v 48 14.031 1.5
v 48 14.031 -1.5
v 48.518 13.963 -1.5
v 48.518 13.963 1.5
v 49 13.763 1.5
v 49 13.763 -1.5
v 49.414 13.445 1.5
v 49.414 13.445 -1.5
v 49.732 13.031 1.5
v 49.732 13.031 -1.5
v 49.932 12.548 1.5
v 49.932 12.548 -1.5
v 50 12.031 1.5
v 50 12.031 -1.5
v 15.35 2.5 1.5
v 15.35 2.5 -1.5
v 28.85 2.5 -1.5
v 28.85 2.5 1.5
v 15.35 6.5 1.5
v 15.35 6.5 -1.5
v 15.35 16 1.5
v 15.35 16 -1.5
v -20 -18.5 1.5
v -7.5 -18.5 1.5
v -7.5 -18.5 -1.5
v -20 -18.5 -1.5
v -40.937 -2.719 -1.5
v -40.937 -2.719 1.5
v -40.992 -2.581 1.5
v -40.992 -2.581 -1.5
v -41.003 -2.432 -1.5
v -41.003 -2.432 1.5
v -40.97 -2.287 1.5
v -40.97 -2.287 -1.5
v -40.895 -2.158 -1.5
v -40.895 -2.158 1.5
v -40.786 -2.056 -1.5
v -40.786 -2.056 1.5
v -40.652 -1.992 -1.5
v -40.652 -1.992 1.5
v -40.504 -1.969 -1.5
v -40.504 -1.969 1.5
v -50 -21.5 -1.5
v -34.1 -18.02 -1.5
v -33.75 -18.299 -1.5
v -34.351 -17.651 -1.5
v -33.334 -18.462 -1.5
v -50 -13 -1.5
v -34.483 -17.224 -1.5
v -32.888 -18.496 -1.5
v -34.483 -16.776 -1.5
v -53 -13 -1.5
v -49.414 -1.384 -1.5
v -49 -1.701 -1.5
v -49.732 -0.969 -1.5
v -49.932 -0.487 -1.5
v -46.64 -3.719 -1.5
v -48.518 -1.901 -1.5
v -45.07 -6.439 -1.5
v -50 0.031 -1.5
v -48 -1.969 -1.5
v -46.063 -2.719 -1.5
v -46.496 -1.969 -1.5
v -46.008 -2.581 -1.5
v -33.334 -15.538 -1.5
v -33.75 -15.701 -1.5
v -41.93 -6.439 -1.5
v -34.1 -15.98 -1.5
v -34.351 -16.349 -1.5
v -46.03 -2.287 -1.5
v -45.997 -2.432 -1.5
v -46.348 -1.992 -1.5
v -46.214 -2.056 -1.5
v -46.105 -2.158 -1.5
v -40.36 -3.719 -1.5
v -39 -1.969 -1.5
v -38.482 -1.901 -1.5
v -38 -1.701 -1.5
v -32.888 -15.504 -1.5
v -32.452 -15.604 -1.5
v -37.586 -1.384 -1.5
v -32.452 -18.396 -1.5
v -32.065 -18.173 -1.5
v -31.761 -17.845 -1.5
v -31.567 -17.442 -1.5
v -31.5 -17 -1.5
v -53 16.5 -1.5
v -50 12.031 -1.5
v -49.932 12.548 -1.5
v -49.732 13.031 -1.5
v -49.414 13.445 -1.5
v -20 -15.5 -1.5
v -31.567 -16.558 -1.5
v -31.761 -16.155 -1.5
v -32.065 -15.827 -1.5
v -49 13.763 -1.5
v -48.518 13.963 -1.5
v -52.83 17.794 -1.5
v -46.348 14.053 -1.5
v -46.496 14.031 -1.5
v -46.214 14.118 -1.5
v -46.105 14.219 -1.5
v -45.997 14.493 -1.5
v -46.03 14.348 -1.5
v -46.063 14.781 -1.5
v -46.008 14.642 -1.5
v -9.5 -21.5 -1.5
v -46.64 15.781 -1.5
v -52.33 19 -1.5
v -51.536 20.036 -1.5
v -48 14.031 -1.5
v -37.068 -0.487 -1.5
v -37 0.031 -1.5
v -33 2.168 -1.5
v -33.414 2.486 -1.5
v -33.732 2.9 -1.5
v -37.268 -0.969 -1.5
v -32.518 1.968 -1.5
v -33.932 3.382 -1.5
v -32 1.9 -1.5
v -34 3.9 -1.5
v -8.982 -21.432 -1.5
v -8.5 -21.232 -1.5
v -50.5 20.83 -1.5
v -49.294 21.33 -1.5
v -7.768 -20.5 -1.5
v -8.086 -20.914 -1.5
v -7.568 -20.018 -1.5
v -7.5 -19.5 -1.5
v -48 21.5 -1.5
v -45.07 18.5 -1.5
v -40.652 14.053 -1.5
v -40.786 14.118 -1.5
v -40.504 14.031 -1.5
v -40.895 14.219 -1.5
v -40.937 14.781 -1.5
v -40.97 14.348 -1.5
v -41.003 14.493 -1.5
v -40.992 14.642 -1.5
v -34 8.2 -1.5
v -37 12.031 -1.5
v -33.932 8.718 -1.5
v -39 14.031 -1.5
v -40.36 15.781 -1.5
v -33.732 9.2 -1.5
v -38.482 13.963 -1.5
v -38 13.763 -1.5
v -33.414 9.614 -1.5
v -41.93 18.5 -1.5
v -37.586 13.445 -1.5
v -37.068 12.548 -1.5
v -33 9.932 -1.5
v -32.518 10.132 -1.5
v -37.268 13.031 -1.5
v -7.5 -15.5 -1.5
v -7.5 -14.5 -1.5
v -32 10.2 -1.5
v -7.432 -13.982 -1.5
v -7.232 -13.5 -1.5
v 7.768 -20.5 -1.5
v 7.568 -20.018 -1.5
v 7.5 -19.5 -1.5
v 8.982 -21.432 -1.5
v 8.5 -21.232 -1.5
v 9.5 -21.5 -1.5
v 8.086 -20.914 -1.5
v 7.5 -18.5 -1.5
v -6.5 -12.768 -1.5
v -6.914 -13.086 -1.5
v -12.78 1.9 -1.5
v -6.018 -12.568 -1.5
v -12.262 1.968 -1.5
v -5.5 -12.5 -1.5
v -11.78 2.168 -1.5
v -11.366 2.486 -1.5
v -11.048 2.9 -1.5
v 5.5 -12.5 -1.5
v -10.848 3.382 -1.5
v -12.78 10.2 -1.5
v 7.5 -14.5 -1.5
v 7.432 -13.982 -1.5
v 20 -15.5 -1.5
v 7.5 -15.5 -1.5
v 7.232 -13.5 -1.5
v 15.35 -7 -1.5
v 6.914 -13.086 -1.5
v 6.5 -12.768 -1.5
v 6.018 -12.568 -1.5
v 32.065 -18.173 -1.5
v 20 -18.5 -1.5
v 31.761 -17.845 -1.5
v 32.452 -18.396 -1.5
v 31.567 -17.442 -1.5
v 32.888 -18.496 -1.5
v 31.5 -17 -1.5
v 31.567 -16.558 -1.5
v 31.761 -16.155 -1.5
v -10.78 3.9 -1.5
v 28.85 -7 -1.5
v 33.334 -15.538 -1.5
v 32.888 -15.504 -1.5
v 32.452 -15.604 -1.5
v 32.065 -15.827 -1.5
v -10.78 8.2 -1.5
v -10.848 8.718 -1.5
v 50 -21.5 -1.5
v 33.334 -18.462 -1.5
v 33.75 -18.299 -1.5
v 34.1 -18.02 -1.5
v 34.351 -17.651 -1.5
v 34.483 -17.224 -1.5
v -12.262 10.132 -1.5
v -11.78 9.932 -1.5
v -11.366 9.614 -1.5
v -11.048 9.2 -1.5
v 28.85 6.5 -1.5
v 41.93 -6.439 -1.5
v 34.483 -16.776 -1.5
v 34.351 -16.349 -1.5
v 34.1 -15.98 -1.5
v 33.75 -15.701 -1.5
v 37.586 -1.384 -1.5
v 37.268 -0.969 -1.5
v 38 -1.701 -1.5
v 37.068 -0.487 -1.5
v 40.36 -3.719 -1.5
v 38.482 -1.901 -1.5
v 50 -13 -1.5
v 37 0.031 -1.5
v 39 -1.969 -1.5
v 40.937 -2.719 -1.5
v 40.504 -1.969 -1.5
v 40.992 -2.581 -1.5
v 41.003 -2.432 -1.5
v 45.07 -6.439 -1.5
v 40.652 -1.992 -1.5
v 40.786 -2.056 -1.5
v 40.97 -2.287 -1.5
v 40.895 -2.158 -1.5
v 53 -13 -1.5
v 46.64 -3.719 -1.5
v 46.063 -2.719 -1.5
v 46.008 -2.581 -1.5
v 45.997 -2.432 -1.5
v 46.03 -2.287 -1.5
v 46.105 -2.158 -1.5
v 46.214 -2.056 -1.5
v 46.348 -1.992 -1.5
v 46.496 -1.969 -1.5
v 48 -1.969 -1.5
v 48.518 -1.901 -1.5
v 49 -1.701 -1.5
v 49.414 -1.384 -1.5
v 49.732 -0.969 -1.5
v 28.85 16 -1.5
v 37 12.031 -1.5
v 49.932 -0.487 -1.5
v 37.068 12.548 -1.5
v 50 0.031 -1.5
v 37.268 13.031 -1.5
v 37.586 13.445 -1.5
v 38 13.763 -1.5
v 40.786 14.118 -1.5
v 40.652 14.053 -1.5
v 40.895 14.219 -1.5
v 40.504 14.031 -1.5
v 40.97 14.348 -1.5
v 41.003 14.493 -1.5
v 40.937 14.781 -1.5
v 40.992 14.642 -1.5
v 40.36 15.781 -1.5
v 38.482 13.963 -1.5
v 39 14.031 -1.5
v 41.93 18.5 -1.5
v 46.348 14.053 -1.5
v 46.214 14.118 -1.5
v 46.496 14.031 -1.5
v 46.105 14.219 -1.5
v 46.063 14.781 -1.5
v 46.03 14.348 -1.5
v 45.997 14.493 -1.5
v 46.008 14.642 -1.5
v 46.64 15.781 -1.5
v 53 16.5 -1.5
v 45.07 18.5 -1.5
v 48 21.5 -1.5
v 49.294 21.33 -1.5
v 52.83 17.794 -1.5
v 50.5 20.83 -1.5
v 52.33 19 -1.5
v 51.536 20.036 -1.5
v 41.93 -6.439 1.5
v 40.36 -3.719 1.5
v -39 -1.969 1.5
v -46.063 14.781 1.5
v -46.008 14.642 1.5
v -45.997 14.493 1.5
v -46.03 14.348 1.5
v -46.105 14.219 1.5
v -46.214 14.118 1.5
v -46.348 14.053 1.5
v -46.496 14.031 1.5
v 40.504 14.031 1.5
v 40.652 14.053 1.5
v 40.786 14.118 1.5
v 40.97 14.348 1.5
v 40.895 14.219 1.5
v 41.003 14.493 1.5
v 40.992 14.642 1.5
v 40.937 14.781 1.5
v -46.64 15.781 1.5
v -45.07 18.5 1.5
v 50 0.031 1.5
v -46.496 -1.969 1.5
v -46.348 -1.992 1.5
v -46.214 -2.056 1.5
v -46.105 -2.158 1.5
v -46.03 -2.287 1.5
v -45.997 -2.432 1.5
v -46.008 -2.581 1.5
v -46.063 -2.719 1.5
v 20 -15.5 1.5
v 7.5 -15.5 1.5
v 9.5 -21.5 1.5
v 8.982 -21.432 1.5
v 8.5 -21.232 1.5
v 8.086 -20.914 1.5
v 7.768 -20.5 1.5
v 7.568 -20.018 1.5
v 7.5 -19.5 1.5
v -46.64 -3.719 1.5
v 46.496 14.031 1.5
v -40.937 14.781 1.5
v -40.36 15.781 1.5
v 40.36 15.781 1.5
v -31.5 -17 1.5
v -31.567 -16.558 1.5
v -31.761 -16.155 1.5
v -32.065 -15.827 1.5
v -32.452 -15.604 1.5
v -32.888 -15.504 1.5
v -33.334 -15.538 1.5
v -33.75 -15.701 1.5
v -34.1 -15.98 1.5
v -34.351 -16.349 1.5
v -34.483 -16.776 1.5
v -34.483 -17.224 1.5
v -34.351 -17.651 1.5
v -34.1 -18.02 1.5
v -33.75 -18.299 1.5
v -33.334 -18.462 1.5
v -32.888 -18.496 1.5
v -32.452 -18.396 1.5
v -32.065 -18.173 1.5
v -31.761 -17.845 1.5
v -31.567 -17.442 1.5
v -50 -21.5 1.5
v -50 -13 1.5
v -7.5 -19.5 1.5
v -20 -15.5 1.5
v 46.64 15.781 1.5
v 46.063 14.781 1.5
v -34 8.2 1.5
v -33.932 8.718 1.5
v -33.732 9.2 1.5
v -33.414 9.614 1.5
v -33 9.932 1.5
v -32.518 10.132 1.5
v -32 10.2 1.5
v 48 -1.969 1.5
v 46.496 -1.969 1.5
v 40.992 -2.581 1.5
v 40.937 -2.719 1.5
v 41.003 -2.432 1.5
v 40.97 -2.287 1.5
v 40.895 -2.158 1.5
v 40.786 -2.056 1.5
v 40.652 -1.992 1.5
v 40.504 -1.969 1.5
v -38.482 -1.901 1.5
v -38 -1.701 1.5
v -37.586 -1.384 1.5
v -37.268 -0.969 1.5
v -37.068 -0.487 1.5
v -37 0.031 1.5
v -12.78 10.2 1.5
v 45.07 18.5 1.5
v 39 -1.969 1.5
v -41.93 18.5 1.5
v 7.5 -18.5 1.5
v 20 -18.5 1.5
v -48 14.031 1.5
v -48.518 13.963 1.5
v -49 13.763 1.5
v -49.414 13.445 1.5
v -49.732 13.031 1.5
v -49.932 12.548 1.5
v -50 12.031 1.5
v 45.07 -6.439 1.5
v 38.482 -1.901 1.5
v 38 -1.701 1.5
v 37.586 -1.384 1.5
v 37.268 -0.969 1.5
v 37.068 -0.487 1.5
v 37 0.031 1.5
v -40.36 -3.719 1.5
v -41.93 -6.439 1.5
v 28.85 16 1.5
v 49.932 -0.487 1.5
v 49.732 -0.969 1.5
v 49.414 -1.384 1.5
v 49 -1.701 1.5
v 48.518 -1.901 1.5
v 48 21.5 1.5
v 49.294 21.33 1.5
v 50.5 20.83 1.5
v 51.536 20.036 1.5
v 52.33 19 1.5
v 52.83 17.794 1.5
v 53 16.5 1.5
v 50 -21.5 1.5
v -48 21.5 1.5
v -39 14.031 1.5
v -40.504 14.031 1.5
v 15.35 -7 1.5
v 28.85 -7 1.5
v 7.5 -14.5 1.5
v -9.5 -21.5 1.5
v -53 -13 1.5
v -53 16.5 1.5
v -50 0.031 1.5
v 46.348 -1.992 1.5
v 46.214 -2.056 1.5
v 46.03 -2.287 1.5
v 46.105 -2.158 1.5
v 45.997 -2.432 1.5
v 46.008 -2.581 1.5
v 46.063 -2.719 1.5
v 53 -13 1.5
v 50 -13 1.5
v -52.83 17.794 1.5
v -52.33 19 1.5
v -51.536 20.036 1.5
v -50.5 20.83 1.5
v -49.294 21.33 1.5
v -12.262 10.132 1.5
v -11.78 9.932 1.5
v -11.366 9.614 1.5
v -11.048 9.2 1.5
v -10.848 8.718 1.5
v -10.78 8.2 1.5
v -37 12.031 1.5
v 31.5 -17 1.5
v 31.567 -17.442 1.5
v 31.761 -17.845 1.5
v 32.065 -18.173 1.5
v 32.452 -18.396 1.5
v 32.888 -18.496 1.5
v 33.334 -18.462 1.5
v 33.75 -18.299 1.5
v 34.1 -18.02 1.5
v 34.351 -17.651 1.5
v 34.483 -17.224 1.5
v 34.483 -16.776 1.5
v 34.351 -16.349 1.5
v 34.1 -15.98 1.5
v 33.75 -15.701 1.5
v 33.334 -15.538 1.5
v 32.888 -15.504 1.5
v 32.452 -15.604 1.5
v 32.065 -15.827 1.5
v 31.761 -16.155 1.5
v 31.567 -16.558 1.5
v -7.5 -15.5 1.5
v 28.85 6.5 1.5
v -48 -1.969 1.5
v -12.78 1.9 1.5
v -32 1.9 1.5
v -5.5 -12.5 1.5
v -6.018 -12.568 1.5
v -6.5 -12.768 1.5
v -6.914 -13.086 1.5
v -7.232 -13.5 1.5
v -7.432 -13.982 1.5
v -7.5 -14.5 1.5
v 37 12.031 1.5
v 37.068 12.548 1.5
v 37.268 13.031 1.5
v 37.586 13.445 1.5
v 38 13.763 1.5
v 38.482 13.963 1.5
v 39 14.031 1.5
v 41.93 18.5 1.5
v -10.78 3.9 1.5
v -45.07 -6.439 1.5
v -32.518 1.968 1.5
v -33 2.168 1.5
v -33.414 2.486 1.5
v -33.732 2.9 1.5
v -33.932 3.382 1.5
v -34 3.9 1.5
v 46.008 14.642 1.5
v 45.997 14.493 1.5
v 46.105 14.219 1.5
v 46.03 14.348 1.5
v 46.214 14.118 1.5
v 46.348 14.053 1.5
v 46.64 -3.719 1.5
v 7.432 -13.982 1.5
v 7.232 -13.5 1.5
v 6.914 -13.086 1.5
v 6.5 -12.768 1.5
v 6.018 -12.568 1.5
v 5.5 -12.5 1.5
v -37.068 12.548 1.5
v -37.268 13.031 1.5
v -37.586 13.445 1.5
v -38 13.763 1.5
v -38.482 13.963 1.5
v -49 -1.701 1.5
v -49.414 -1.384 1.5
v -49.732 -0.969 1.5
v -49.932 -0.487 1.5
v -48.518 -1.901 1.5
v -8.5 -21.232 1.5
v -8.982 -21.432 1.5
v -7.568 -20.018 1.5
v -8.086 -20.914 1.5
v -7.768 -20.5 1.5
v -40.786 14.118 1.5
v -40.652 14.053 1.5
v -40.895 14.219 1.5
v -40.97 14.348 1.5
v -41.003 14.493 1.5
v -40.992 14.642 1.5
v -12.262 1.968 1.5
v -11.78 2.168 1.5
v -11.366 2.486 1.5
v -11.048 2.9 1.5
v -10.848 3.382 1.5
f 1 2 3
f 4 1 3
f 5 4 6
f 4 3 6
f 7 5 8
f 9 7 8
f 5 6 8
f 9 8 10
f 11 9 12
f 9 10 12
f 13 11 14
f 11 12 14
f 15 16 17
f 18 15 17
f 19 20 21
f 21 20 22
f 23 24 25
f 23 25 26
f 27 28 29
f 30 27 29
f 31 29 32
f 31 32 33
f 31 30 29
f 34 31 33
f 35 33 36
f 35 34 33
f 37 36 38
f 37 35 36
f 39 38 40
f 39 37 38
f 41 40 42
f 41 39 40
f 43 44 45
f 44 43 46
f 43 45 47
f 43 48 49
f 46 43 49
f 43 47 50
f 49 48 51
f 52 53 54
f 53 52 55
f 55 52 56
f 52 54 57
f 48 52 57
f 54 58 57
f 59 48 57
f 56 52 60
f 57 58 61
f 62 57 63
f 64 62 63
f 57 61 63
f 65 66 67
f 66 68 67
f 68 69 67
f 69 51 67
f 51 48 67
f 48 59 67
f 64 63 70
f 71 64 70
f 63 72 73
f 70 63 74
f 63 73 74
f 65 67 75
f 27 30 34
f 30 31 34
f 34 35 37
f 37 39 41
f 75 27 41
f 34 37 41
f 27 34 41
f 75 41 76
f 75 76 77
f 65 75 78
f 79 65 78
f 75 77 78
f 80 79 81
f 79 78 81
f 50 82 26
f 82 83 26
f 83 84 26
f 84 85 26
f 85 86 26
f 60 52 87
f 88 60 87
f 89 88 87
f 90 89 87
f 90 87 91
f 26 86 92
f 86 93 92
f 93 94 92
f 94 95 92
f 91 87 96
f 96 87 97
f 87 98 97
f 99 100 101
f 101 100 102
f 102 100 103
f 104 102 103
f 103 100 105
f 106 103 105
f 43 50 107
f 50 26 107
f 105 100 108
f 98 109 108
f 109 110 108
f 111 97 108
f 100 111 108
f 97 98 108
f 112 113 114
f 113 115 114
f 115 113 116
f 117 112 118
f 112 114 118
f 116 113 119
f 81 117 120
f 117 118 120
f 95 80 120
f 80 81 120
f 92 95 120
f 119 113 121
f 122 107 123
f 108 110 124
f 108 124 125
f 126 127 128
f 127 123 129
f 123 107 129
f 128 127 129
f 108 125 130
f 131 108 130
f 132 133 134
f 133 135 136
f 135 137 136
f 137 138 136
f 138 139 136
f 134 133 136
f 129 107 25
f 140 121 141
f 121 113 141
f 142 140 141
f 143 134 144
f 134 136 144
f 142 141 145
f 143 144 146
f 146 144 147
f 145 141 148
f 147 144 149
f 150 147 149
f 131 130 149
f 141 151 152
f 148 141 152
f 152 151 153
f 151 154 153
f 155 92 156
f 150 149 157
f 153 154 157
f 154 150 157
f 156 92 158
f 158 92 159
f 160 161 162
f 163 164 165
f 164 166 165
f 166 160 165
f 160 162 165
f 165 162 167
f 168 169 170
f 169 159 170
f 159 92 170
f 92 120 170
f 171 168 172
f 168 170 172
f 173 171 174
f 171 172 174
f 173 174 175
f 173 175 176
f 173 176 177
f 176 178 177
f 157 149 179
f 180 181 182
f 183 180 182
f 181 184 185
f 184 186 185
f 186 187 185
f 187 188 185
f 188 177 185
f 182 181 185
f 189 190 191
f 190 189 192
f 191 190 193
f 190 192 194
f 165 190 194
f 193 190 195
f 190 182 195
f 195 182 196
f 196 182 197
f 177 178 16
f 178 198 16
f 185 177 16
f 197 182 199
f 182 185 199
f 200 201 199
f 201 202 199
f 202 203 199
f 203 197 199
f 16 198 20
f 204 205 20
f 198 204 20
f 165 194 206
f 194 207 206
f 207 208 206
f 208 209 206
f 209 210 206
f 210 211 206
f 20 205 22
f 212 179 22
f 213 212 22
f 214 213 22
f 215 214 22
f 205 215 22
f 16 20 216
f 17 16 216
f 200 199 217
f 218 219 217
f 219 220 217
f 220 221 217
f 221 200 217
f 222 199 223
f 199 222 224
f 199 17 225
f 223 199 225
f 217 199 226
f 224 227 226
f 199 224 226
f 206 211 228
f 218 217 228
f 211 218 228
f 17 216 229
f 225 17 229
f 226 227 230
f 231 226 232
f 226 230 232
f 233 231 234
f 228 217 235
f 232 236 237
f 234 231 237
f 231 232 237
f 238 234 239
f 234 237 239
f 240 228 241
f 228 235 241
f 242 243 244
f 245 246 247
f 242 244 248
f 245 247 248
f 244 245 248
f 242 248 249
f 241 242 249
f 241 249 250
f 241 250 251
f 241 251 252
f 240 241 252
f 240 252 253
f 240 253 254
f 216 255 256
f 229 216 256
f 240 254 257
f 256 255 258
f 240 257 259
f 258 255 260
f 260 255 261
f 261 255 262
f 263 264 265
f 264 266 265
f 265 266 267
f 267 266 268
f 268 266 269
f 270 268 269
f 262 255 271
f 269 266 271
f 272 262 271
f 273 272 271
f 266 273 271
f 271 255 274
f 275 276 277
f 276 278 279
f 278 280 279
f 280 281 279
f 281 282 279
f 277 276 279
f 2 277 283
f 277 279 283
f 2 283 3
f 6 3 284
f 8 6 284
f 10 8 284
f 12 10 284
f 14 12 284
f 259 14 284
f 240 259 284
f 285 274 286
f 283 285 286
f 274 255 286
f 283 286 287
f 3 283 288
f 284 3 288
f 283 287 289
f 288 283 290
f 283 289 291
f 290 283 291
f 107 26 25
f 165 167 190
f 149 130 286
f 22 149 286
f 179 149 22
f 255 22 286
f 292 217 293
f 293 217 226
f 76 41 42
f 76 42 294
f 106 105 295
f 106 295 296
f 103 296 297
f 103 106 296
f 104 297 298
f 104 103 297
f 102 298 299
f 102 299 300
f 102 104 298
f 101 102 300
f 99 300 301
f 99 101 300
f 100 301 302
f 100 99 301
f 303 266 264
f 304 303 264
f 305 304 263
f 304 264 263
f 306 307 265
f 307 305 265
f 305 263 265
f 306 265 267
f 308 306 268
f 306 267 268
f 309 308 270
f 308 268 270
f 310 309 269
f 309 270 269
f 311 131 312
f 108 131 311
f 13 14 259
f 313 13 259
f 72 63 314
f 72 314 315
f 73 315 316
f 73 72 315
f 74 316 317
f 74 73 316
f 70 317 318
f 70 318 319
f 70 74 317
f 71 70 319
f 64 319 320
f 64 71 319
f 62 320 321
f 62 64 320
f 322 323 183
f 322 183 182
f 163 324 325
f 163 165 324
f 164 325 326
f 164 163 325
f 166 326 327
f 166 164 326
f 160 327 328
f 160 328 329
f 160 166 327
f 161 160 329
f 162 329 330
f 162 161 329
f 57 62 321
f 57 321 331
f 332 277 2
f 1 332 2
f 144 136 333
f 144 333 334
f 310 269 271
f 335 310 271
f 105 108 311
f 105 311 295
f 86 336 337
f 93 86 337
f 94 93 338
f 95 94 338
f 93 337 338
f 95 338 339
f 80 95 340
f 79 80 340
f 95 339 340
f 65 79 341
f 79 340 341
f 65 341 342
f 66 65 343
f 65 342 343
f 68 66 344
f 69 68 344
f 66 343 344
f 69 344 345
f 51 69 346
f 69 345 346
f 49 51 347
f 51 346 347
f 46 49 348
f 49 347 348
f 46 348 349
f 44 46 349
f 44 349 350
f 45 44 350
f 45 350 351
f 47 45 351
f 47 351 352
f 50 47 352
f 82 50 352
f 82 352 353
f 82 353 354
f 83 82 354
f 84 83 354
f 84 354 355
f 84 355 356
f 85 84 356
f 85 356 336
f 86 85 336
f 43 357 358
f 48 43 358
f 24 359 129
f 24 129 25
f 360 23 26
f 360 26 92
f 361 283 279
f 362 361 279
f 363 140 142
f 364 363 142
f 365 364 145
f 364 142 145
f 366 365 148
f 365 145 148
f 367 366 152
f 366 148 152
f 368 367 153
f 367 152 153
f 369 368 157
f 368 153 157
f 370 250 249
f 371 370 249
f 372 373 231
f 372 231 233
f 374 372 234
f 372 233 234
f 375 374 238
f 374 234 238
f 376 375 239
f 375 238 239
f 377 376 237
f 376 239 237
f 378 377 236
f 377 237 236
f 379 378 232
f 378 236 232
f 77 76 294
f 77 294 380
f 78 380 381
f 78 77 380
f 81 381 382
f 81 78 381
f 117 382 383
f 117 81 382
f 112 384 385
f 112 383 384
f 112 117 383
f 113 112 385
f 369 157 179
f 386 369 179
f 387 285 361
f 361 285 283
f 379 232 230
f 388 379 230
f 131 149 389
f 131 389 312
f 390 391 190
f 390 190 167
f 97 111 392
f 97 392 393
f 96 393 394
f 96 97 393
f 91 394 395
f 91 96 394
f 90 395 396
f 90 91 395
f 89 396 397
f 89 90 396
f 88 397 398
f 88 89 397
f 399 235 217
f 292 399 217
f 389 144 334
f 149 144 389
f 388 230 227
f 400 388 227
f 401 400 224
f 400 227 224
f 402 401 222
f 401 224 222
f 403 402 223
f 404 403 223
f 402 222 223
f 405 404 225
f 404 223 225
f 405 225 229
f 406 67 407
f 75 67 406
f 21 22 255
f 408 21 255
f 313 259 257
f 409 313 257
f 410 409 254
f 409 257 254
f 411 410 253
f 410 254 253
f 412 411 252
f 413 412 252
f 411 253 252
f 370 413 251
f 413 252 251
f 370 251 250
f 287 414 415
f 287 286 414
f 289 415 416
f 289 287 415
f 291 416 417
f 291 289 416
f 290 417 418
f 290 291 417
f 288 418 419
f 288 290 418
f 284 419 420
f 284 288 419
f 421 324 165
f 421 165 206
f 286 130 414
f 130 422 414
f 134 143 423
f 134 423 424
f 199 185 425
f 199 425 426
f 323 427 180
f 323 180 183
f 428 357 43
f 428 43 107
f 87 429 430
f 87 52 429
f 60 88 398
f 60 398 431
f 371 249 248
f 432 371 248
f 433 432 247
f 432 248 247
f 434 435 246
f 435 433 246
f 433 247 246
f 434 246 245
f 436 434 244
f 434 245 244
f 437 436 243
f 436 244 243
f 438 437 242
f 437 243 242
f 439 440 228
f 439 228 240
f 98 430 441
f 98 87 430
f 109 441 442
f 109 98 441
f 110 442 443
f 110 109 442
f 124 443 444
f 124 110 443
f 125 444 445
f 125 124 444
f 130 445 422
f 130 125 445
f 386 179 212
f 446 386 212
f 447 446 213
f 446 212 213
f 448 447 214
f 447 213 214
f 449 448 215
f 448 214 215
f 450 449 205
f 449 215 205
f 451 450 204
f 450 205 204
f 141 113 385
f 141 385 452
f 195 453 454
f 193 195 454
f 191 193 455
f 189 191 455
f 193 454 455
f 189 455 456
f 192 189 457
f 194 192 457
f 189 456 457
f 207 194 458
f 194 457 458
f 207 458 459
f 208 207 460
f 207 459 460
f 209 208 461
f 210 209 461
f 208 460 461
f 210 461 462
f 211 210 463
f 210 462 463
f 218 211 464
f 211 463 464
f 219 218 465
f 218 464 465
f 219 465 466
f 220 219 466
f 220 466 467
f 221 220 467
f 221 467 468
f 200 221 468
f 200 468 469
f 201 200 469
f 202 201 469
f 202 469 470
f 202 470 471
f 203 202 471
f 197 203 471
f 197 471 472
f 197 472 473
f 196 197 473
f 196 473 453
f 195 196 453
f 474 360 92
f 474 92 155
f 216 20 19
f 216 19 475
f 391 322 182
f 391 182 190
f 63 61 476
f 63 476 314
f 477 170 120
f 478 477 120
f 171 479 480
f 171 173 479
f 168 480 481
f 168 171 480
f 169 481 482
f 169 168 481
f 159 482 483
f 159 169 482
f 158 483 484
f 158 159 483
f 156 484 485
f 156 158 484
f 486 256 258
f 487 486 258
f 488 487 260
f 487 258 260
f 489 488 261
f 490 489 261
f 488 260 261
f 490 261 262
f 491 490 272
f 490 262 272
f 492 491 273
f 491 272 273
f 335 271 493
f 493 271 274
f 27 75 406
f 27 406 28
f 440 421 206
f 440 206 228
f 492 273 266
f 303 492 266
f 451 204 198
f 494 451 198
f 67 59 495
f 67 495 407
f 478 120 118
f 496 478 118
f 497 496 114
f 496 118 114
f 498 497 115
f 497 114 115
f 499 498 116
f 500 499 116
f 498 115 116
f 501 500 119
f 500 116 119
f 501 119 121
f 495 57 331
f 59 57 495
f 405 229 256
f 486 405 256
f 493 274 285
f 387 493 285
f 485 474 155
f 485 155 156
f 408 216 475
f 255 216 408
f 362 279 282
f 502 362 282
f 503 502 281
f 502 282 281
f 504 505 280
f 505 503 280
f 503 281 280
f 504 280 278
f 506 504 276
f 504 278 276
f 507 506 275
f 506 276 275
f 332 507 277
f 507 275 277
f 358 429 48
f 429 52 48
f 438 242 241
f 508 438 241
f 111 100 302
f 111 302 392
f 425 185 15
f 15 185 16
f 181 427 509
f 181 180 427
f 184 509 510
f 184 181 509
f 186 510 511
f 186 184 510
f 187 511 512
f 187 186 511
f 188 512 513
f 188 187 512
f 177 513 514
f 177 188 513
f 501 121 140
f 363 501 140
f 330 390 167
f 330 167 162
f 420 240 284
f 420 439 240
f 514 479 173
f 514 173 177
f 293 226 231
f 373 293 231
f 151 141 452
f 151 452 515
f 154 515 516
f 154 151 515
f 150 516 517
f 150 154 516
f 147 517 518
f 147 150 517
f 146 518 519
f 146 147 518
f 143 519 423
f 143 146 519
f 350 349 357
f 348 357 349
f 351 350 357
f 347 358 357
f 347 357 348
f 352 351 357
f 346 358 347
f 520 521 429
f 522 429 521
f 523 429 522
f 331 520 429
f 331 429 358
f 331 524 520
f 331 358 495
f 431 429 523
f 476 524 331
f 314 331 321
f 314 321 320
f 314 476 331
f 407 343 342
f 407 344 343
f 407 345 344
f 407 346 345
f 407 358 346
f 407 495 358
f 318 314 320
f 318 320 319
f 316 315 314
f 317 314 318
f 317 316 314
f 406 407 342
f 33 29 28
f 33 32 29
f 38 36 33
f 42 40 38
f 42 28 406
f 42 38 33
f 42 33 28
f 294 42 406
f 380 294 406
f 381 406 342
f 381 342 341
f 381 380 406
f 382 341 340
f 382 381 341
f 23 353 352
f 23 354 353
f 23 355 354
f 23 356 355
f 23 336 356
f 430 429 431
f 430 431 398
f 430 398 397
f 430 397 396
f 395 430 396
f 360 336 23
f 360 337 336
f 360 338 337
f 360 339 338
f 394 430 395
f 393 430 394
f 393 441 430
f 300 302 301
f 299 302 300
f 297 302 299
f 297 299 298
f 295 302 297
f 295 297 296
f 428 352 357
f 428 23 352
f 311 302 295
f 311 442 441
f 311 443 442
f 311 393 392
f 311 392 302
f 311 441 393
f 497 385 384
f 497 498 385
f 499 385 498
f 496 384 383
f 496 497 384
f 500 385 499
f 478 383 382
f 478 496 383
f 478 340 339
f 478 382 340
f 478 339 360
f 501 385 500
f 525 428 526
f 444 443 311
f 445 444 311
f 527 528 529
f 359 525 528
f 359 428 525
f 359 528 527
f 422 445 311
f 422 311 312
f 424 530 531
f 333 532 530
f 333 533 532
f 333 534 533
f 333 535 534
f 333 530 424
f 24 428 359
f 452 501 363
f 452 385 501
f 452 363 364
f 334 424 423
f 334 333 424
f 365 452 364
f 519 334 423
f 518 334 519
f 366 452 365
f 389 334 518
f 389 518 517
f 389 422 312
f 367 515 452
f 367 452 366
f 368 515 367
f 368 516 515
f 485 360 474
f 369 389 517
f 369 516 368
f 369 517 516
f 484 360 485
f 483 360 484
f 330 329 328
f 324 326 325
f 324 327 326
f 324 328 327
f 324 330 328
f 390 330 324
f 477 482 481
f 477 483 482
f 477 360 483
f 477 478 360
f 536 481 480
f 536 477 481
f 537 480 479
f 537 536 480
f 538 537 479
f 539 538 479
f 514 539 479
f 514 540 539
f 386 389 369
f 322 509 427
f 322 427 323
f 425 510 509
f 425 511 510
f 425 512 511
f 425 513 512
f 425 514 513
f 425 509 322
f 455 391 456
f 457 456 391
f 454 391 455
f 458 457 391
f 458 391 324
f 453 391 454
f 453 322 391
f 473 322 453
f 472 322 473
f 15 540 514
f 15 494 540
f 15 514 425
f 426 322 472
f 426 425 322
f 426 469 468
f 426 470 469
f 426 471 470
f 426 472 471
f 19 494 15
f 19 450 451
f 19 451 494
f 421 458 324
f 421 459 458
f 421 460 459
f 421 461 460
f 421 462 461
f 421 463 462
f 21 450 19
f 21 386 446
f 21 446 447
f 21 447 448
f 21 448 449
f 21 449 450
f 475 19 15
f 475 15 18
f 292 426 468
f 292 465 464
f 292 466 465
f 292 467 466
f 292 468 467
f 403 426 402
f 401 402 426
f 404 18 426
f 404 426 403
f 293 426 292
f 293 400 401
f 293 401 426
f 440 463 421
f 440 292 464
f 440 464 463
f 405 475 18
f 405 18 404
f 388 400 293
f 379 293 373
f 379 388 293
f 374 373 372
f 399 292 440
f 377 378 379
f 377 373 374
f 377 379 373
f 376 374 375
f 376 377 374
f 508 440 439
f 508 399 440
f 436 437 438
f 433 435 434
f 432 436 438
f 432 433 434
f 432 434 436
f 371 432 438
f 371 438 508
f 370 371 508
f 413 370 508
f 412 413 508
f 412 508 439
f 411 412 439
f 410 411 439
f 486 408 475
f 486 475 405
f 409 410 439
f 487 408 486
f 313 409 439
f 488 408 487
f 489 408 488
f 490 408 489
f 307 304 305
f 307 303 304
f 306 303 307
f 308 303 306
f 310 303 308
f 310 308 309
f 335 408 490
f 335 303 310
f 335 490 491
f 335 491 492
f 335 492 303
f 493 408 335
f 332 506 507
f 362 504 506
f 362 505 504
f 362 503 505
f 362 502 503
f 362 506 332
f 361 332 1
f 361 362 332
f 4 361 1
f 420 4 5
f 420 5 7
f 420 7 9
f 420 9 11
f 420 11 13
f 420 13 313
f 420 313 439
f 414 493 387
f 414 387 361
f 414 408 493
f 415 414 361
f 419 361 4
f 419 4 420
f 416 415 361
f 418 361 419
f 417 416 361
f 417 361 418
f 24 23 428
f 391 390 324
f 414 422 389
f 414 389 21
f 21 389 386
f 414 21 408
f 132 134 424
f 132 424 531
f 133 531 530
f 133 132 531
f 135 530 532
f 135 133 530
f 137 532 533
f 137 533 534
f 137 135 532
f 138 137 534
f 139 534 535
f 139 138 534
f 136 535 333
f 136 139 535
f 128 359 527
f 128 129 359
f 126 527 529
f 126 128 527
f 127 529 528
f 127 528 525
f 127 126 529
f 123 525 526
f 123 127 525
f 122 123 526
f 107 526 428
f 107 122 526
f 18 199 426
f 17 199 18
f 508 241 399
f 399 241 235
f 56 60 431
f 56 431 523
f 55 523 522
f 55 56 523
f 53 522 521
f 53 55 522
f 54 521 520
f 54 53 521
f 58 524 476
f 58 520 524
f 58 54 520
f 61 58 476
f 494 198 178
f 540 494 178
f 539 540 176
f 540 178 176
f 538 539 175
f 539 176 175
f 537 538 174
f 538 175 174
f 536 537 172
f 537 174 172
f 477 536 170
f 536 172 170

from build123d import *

# Parameters (mm, degrees)
ESBO_O1_W                  = 100
ESBO_O1_H                  = 43
RESSALTO_EXTRUS_O1_DEPTH   = 1.5
ESBO_O2_R                  = 1.5
CORTE_EXTRUS_O1_DEPTH      = 55.50917354
CUT_EXTRUDE6_DEPTH         = 55.447222151
CUT_EXTRUDE6_DEPTH_BACK    = 55.447222151
SKETCH7_W                  = 13.5
SKETCH7_H                  = 9.5
SKETCH8_W                  = 3
SKETCH8_H                  = 34.5
BOSS_EXTRUDE1_DEPTH        = 1.5
FILLET3_R                  = 2
FILLET4_R                  = 5
CORTE_GY_VL53L0_DEPTH      = 58.214508649
CORTE_GY_VL53L0_DEPTH_BACK = 58.214508649
CUT_EXTRUDE7_DEPTH         = 58.273466806
CUT_EXTRUDE7_DEPTH_BACK    = 58.273466806


with BuildPart() as part:
    # Esboço1 → Ressalto-extrusão1 (new, symmetric)
    with BuildSketch(Plane.XY):
        Rectangle(ESBO_O1_W, ESBO_O1_H)
    extrude(amount=RESSALTO_EXTRUS_O1_DEPTH, both=True)

    # Esboço2 → Corte-extrusão1 (cut, through all)
    with BuildSketch(Plane.XY.offset(1.5)):
        with Locations((-33, -17)):
            Circle(ESBO_O2_R)
        with Locations(Location((33, -17, 0), (0, 0, 180))):
            Circle(ESBO_O2_R)
        Polygon((-20, -15.5), (-7.5, -15.5), (-7.5, -12.5), (7.5, -12.5), (7.5, -15.5), (20, -15.5), (20, -18.5), (7.5, -18.5), (7.5, -21.5), (-7.5, -21.5), (-7.5, -18.5), (-20, -18.5), align=None)
    extrude(amount=-CORTE_EXTRUS_O1_DEPTH, mode=Mode.SUBTRACT)

    # Sketch7 → Cut-Extrude6 (cut, two sides: drawn at the far end of the back side and taken through both)
    with BuildSketch(Plane.XY.offset(-CUT_EXTRUDE6_DEPTH_BACK)):
        with Locations((22.1, -2.25)):
            Rectangle(SKETCH7_W, SKETCH7_H)
        with Locations((22.1, 11.25)):
            Rectangle(SKETCH7_W, SKETCH7_H)
    extrude(amount=CUT_EXTRUDE6_DEPTH + CUT_EXTRUDE6_DEPTH_BACK, mode=Mode.SUBTRACT)

    # Sketch8 → Boss-Extrude1 (add, symmetric)
    with BuildSketch(Plane.XY):
        with Locations((-51.5, 4.25)):
            Rectangle(SKETCH8_W, SKETCH8_H)
        with Locations((51.5, 4.25)):
            Rectangle(SKETCH8_W, SKETCH8_H)
    extrude(amount=BOSS_EXTRUDE1_DEPTH, both=True)

    # Fillet3
    fillet3_edges = [part.edges().sort_by_distance(p)[0] for p in [
        (-7.5, -21.5, 0),
        (-7.5, -12.5, 0),
        (7.5, -12.5, 0),
        (7.5, -21.5, 0),
    ]]
    fillet(fillet3_edges, radius=FILLET3_R)

    # Fillet4
    fillet4_edges = [part.edges().sort_by_distance(p)[0] for p in [
        (53, 21.5, 0),
        (-53, 21.5, 0),
    ]]
    fillet(fillet4_edges, radius=FILLET4_R)

    # Sketch6 → Corte Gy-VL53L0 (cut, two sides: drawn at the far end of the back side and taken through both)
    with BuildSketch(Plane.XY.offset(-CORTE_GY_VL53L0_DEPTH_BACK)):
        with BuildLine():
            Line((-40.5, 14.030680232), (-40.504337567, 14.030680232))
            ThreePointArc((-40.504337567, 14.030680232), (-40.937350269, 14.280680232), (-40.937350269, 14.780680232))
            Line((-40.937350269, 14.780680232), (-40.36, 15.780680232))
            Line((-40.36, 15.780680232), (-41.93, 18.5))
            Line((-41.93, 18.5), (-45.07, 18.5))
            Line((-45.07, 18.5), (-46.64, 15.780680232))
            Line((-46.64, 15.780680232), (-46.062649731, 14.780680232))
            ThreePointArc((-46.062649731, 14.780680232), (-46.062649731, 14.280680232), (-46.495662433, 14.030680232))
            Line((-46.495662433, 14.030680232), (-48, 14.030680232))
            ThreePointArc((-48, 14.030680232), (-49.414213562, 13.444893794), (-50, 12.030680232))
            Line((-50, 12.030680232), (-50, 0.030680232))
            ThreePointArc((-50, 0.030680232), (-49.414213562, -1.38353333), (-48, -1.969319768))
            Line((-48, -1.969319768), (-46.495662433, -1.969319768))
            ThreePointArc((-46.495662433, -1.969319768), (-46.062649731, -2.219319768), (-46.062649731, -2.719319768))
            Line((-46.062649731, -2.719319768), (-46.64, -3.719319768))
            Line((-46.64, -3.719319768), (-45.07, -6.438639536))
            Line((-45.07, -6.438639536), (-41.93, -6.438639536))
            Line((-41.93, -6.438639536), (-40.36, -3.719319768))
            Line((-40.36, -3.719319768), (-40.937350269, -2.719319768))
            ThreePointArc((-40.937350269, -2.719319768), (-40.937350269, -2.219319768), (-40.504337567, -1.969319768))
            Line((-40.504337567, -1.969319768), (-39, -1.969319768))
            ThreePointArc((-39, -1.969319768), (-37.585786438, -1.38353333), (-37, 0.030680232))
            Line((-37, 0.030680232), (-37, 6.030680232))
            Line((-37, 6.030680232), (-37, 12.030680232))
            ThreePointArc((-37, 12.030680232), (-37.585786438, 13.444893794), (-39, 14.030680232))
            Line((-39, 14.030680232), (-40.5, 14.030680232))
        make_face()
        with BuildLine():
            Line((40.5, 14.030680232), (40.504337567, 14.030680232))
            ThreePointArc((40.504337567, 14.030680232), (40.937350269, 14.280680232), (40.937350269, 14.780680232))
            Line((40.937350269, 14.780680232), (40.36, 15.780680232))
            Line((40.36, 15.780680232), (41.93, 18.5))
            Line((41.93, 18.5), (45.07, 18.5))
            Line((45.07, 18.5), (46.64, 15.780680232))
            Line((46.64, 15.780680232), (46.062649731, 14.780680232))
            ThreePointArc((46.062649731, 14.780680232), (46.062649731, 14.280680232), (46.495662433, 14.030680232))
            Line((46.495662433, 14.030680232), (48, 14.030680232))
            ThreePointArc((48, 14.030680232), (49.414213562, 13.444893794), (50, 12.030680232))
            Line((50, 12.030680232), (50, 0.030680232))
            ThreePointArc((50, 0.030680232), (49.414213562, -1.38353333), (48, -1.969319768))
            Line((48, -1.969319768), (46.495662433, -1.969319768))
            ThreePointArc((46.495662433, -1.969319768), (46.062649731, -2.219319768), (46.062649731, -2.719319768))
            Line((46.062649731, -2.719319768), (46.64, -3.719319768))
            Line((46.64, -3.719319768), (45.07, -6.438639536))
            Line((45.07, -6.438639536), (41.93, -6.438639536))
            Line((41.93, -6.438639536), (40.36, -3.719319768))
            Line((40.36, -3.719319768), (40.937350269, -2.719319768))
            ThreePointArc((40.937350269, -2.719319768), (40.937350269, -2.219319768), (40.504337567, -1.969319768))
            Line((40.504337567, -1.969319768), (39, -1.969319768))
            ThreePointArc((39, -1.969319768), (37.585786438, -1.38353333), (37, 0.030680232))
            Line((37, 0.030680232), (37, 6.030680232))
            Line((37, 6.030680232), (37, 12.030680232))
            ThreePointArc((37, 12.030680232), (37.585786438, 13.444893794), (39, 14.030680232))
            Line((39, 14.030680232), (40.5, 14.030680232))
        make_face()
    extrude(amount=CORTE_GY_VL53L0_DEPTH + CORTE_GY_VL53L0_DEPTH_BACK, mode=Mode.SUBTRACT)

    # Sketch11 → Cut-Extrude7 (cut, two sides: drawn at the far end of the back side and taken through both)
    with BuildSketch(Plane.XY.offset(1.5).offset(-CUT_EXTRUDE7_DEPTH_BACK)):
        with BuildLine():
            Line((-32, 10.2), (-12.78, 10.2))
            ThreePointArc((-12.78, 10.2), (-11.365786438, 9.614213562), (-10.78, 8.2))
            Line((-10.78, 8.2), (-10.78, 3.9))
            ThreePointArc((-10.78, 3.9), (-11.365786438, 2.485786438), (-12.78, 1.9))
            Line((-12.78, 1.9), (-32, 1.9))
            ThreePointArc((-32, 1.9), (-33.414213562, 2.485786438), (-34, 3.9))
            Line((-34, 3.9), (-34, 8.2))
            ThreePointArc((-34, 8.2), (-33.414213562, 9.614213562), (-32, 10.2))
        make_face()
    extrude(amount=CUT_EXTRUDE7_DEPTH + CUT_EXTRUDE7_DEPTH_BACK, mode=Mode.SUBTRACT)


solid = part.part
